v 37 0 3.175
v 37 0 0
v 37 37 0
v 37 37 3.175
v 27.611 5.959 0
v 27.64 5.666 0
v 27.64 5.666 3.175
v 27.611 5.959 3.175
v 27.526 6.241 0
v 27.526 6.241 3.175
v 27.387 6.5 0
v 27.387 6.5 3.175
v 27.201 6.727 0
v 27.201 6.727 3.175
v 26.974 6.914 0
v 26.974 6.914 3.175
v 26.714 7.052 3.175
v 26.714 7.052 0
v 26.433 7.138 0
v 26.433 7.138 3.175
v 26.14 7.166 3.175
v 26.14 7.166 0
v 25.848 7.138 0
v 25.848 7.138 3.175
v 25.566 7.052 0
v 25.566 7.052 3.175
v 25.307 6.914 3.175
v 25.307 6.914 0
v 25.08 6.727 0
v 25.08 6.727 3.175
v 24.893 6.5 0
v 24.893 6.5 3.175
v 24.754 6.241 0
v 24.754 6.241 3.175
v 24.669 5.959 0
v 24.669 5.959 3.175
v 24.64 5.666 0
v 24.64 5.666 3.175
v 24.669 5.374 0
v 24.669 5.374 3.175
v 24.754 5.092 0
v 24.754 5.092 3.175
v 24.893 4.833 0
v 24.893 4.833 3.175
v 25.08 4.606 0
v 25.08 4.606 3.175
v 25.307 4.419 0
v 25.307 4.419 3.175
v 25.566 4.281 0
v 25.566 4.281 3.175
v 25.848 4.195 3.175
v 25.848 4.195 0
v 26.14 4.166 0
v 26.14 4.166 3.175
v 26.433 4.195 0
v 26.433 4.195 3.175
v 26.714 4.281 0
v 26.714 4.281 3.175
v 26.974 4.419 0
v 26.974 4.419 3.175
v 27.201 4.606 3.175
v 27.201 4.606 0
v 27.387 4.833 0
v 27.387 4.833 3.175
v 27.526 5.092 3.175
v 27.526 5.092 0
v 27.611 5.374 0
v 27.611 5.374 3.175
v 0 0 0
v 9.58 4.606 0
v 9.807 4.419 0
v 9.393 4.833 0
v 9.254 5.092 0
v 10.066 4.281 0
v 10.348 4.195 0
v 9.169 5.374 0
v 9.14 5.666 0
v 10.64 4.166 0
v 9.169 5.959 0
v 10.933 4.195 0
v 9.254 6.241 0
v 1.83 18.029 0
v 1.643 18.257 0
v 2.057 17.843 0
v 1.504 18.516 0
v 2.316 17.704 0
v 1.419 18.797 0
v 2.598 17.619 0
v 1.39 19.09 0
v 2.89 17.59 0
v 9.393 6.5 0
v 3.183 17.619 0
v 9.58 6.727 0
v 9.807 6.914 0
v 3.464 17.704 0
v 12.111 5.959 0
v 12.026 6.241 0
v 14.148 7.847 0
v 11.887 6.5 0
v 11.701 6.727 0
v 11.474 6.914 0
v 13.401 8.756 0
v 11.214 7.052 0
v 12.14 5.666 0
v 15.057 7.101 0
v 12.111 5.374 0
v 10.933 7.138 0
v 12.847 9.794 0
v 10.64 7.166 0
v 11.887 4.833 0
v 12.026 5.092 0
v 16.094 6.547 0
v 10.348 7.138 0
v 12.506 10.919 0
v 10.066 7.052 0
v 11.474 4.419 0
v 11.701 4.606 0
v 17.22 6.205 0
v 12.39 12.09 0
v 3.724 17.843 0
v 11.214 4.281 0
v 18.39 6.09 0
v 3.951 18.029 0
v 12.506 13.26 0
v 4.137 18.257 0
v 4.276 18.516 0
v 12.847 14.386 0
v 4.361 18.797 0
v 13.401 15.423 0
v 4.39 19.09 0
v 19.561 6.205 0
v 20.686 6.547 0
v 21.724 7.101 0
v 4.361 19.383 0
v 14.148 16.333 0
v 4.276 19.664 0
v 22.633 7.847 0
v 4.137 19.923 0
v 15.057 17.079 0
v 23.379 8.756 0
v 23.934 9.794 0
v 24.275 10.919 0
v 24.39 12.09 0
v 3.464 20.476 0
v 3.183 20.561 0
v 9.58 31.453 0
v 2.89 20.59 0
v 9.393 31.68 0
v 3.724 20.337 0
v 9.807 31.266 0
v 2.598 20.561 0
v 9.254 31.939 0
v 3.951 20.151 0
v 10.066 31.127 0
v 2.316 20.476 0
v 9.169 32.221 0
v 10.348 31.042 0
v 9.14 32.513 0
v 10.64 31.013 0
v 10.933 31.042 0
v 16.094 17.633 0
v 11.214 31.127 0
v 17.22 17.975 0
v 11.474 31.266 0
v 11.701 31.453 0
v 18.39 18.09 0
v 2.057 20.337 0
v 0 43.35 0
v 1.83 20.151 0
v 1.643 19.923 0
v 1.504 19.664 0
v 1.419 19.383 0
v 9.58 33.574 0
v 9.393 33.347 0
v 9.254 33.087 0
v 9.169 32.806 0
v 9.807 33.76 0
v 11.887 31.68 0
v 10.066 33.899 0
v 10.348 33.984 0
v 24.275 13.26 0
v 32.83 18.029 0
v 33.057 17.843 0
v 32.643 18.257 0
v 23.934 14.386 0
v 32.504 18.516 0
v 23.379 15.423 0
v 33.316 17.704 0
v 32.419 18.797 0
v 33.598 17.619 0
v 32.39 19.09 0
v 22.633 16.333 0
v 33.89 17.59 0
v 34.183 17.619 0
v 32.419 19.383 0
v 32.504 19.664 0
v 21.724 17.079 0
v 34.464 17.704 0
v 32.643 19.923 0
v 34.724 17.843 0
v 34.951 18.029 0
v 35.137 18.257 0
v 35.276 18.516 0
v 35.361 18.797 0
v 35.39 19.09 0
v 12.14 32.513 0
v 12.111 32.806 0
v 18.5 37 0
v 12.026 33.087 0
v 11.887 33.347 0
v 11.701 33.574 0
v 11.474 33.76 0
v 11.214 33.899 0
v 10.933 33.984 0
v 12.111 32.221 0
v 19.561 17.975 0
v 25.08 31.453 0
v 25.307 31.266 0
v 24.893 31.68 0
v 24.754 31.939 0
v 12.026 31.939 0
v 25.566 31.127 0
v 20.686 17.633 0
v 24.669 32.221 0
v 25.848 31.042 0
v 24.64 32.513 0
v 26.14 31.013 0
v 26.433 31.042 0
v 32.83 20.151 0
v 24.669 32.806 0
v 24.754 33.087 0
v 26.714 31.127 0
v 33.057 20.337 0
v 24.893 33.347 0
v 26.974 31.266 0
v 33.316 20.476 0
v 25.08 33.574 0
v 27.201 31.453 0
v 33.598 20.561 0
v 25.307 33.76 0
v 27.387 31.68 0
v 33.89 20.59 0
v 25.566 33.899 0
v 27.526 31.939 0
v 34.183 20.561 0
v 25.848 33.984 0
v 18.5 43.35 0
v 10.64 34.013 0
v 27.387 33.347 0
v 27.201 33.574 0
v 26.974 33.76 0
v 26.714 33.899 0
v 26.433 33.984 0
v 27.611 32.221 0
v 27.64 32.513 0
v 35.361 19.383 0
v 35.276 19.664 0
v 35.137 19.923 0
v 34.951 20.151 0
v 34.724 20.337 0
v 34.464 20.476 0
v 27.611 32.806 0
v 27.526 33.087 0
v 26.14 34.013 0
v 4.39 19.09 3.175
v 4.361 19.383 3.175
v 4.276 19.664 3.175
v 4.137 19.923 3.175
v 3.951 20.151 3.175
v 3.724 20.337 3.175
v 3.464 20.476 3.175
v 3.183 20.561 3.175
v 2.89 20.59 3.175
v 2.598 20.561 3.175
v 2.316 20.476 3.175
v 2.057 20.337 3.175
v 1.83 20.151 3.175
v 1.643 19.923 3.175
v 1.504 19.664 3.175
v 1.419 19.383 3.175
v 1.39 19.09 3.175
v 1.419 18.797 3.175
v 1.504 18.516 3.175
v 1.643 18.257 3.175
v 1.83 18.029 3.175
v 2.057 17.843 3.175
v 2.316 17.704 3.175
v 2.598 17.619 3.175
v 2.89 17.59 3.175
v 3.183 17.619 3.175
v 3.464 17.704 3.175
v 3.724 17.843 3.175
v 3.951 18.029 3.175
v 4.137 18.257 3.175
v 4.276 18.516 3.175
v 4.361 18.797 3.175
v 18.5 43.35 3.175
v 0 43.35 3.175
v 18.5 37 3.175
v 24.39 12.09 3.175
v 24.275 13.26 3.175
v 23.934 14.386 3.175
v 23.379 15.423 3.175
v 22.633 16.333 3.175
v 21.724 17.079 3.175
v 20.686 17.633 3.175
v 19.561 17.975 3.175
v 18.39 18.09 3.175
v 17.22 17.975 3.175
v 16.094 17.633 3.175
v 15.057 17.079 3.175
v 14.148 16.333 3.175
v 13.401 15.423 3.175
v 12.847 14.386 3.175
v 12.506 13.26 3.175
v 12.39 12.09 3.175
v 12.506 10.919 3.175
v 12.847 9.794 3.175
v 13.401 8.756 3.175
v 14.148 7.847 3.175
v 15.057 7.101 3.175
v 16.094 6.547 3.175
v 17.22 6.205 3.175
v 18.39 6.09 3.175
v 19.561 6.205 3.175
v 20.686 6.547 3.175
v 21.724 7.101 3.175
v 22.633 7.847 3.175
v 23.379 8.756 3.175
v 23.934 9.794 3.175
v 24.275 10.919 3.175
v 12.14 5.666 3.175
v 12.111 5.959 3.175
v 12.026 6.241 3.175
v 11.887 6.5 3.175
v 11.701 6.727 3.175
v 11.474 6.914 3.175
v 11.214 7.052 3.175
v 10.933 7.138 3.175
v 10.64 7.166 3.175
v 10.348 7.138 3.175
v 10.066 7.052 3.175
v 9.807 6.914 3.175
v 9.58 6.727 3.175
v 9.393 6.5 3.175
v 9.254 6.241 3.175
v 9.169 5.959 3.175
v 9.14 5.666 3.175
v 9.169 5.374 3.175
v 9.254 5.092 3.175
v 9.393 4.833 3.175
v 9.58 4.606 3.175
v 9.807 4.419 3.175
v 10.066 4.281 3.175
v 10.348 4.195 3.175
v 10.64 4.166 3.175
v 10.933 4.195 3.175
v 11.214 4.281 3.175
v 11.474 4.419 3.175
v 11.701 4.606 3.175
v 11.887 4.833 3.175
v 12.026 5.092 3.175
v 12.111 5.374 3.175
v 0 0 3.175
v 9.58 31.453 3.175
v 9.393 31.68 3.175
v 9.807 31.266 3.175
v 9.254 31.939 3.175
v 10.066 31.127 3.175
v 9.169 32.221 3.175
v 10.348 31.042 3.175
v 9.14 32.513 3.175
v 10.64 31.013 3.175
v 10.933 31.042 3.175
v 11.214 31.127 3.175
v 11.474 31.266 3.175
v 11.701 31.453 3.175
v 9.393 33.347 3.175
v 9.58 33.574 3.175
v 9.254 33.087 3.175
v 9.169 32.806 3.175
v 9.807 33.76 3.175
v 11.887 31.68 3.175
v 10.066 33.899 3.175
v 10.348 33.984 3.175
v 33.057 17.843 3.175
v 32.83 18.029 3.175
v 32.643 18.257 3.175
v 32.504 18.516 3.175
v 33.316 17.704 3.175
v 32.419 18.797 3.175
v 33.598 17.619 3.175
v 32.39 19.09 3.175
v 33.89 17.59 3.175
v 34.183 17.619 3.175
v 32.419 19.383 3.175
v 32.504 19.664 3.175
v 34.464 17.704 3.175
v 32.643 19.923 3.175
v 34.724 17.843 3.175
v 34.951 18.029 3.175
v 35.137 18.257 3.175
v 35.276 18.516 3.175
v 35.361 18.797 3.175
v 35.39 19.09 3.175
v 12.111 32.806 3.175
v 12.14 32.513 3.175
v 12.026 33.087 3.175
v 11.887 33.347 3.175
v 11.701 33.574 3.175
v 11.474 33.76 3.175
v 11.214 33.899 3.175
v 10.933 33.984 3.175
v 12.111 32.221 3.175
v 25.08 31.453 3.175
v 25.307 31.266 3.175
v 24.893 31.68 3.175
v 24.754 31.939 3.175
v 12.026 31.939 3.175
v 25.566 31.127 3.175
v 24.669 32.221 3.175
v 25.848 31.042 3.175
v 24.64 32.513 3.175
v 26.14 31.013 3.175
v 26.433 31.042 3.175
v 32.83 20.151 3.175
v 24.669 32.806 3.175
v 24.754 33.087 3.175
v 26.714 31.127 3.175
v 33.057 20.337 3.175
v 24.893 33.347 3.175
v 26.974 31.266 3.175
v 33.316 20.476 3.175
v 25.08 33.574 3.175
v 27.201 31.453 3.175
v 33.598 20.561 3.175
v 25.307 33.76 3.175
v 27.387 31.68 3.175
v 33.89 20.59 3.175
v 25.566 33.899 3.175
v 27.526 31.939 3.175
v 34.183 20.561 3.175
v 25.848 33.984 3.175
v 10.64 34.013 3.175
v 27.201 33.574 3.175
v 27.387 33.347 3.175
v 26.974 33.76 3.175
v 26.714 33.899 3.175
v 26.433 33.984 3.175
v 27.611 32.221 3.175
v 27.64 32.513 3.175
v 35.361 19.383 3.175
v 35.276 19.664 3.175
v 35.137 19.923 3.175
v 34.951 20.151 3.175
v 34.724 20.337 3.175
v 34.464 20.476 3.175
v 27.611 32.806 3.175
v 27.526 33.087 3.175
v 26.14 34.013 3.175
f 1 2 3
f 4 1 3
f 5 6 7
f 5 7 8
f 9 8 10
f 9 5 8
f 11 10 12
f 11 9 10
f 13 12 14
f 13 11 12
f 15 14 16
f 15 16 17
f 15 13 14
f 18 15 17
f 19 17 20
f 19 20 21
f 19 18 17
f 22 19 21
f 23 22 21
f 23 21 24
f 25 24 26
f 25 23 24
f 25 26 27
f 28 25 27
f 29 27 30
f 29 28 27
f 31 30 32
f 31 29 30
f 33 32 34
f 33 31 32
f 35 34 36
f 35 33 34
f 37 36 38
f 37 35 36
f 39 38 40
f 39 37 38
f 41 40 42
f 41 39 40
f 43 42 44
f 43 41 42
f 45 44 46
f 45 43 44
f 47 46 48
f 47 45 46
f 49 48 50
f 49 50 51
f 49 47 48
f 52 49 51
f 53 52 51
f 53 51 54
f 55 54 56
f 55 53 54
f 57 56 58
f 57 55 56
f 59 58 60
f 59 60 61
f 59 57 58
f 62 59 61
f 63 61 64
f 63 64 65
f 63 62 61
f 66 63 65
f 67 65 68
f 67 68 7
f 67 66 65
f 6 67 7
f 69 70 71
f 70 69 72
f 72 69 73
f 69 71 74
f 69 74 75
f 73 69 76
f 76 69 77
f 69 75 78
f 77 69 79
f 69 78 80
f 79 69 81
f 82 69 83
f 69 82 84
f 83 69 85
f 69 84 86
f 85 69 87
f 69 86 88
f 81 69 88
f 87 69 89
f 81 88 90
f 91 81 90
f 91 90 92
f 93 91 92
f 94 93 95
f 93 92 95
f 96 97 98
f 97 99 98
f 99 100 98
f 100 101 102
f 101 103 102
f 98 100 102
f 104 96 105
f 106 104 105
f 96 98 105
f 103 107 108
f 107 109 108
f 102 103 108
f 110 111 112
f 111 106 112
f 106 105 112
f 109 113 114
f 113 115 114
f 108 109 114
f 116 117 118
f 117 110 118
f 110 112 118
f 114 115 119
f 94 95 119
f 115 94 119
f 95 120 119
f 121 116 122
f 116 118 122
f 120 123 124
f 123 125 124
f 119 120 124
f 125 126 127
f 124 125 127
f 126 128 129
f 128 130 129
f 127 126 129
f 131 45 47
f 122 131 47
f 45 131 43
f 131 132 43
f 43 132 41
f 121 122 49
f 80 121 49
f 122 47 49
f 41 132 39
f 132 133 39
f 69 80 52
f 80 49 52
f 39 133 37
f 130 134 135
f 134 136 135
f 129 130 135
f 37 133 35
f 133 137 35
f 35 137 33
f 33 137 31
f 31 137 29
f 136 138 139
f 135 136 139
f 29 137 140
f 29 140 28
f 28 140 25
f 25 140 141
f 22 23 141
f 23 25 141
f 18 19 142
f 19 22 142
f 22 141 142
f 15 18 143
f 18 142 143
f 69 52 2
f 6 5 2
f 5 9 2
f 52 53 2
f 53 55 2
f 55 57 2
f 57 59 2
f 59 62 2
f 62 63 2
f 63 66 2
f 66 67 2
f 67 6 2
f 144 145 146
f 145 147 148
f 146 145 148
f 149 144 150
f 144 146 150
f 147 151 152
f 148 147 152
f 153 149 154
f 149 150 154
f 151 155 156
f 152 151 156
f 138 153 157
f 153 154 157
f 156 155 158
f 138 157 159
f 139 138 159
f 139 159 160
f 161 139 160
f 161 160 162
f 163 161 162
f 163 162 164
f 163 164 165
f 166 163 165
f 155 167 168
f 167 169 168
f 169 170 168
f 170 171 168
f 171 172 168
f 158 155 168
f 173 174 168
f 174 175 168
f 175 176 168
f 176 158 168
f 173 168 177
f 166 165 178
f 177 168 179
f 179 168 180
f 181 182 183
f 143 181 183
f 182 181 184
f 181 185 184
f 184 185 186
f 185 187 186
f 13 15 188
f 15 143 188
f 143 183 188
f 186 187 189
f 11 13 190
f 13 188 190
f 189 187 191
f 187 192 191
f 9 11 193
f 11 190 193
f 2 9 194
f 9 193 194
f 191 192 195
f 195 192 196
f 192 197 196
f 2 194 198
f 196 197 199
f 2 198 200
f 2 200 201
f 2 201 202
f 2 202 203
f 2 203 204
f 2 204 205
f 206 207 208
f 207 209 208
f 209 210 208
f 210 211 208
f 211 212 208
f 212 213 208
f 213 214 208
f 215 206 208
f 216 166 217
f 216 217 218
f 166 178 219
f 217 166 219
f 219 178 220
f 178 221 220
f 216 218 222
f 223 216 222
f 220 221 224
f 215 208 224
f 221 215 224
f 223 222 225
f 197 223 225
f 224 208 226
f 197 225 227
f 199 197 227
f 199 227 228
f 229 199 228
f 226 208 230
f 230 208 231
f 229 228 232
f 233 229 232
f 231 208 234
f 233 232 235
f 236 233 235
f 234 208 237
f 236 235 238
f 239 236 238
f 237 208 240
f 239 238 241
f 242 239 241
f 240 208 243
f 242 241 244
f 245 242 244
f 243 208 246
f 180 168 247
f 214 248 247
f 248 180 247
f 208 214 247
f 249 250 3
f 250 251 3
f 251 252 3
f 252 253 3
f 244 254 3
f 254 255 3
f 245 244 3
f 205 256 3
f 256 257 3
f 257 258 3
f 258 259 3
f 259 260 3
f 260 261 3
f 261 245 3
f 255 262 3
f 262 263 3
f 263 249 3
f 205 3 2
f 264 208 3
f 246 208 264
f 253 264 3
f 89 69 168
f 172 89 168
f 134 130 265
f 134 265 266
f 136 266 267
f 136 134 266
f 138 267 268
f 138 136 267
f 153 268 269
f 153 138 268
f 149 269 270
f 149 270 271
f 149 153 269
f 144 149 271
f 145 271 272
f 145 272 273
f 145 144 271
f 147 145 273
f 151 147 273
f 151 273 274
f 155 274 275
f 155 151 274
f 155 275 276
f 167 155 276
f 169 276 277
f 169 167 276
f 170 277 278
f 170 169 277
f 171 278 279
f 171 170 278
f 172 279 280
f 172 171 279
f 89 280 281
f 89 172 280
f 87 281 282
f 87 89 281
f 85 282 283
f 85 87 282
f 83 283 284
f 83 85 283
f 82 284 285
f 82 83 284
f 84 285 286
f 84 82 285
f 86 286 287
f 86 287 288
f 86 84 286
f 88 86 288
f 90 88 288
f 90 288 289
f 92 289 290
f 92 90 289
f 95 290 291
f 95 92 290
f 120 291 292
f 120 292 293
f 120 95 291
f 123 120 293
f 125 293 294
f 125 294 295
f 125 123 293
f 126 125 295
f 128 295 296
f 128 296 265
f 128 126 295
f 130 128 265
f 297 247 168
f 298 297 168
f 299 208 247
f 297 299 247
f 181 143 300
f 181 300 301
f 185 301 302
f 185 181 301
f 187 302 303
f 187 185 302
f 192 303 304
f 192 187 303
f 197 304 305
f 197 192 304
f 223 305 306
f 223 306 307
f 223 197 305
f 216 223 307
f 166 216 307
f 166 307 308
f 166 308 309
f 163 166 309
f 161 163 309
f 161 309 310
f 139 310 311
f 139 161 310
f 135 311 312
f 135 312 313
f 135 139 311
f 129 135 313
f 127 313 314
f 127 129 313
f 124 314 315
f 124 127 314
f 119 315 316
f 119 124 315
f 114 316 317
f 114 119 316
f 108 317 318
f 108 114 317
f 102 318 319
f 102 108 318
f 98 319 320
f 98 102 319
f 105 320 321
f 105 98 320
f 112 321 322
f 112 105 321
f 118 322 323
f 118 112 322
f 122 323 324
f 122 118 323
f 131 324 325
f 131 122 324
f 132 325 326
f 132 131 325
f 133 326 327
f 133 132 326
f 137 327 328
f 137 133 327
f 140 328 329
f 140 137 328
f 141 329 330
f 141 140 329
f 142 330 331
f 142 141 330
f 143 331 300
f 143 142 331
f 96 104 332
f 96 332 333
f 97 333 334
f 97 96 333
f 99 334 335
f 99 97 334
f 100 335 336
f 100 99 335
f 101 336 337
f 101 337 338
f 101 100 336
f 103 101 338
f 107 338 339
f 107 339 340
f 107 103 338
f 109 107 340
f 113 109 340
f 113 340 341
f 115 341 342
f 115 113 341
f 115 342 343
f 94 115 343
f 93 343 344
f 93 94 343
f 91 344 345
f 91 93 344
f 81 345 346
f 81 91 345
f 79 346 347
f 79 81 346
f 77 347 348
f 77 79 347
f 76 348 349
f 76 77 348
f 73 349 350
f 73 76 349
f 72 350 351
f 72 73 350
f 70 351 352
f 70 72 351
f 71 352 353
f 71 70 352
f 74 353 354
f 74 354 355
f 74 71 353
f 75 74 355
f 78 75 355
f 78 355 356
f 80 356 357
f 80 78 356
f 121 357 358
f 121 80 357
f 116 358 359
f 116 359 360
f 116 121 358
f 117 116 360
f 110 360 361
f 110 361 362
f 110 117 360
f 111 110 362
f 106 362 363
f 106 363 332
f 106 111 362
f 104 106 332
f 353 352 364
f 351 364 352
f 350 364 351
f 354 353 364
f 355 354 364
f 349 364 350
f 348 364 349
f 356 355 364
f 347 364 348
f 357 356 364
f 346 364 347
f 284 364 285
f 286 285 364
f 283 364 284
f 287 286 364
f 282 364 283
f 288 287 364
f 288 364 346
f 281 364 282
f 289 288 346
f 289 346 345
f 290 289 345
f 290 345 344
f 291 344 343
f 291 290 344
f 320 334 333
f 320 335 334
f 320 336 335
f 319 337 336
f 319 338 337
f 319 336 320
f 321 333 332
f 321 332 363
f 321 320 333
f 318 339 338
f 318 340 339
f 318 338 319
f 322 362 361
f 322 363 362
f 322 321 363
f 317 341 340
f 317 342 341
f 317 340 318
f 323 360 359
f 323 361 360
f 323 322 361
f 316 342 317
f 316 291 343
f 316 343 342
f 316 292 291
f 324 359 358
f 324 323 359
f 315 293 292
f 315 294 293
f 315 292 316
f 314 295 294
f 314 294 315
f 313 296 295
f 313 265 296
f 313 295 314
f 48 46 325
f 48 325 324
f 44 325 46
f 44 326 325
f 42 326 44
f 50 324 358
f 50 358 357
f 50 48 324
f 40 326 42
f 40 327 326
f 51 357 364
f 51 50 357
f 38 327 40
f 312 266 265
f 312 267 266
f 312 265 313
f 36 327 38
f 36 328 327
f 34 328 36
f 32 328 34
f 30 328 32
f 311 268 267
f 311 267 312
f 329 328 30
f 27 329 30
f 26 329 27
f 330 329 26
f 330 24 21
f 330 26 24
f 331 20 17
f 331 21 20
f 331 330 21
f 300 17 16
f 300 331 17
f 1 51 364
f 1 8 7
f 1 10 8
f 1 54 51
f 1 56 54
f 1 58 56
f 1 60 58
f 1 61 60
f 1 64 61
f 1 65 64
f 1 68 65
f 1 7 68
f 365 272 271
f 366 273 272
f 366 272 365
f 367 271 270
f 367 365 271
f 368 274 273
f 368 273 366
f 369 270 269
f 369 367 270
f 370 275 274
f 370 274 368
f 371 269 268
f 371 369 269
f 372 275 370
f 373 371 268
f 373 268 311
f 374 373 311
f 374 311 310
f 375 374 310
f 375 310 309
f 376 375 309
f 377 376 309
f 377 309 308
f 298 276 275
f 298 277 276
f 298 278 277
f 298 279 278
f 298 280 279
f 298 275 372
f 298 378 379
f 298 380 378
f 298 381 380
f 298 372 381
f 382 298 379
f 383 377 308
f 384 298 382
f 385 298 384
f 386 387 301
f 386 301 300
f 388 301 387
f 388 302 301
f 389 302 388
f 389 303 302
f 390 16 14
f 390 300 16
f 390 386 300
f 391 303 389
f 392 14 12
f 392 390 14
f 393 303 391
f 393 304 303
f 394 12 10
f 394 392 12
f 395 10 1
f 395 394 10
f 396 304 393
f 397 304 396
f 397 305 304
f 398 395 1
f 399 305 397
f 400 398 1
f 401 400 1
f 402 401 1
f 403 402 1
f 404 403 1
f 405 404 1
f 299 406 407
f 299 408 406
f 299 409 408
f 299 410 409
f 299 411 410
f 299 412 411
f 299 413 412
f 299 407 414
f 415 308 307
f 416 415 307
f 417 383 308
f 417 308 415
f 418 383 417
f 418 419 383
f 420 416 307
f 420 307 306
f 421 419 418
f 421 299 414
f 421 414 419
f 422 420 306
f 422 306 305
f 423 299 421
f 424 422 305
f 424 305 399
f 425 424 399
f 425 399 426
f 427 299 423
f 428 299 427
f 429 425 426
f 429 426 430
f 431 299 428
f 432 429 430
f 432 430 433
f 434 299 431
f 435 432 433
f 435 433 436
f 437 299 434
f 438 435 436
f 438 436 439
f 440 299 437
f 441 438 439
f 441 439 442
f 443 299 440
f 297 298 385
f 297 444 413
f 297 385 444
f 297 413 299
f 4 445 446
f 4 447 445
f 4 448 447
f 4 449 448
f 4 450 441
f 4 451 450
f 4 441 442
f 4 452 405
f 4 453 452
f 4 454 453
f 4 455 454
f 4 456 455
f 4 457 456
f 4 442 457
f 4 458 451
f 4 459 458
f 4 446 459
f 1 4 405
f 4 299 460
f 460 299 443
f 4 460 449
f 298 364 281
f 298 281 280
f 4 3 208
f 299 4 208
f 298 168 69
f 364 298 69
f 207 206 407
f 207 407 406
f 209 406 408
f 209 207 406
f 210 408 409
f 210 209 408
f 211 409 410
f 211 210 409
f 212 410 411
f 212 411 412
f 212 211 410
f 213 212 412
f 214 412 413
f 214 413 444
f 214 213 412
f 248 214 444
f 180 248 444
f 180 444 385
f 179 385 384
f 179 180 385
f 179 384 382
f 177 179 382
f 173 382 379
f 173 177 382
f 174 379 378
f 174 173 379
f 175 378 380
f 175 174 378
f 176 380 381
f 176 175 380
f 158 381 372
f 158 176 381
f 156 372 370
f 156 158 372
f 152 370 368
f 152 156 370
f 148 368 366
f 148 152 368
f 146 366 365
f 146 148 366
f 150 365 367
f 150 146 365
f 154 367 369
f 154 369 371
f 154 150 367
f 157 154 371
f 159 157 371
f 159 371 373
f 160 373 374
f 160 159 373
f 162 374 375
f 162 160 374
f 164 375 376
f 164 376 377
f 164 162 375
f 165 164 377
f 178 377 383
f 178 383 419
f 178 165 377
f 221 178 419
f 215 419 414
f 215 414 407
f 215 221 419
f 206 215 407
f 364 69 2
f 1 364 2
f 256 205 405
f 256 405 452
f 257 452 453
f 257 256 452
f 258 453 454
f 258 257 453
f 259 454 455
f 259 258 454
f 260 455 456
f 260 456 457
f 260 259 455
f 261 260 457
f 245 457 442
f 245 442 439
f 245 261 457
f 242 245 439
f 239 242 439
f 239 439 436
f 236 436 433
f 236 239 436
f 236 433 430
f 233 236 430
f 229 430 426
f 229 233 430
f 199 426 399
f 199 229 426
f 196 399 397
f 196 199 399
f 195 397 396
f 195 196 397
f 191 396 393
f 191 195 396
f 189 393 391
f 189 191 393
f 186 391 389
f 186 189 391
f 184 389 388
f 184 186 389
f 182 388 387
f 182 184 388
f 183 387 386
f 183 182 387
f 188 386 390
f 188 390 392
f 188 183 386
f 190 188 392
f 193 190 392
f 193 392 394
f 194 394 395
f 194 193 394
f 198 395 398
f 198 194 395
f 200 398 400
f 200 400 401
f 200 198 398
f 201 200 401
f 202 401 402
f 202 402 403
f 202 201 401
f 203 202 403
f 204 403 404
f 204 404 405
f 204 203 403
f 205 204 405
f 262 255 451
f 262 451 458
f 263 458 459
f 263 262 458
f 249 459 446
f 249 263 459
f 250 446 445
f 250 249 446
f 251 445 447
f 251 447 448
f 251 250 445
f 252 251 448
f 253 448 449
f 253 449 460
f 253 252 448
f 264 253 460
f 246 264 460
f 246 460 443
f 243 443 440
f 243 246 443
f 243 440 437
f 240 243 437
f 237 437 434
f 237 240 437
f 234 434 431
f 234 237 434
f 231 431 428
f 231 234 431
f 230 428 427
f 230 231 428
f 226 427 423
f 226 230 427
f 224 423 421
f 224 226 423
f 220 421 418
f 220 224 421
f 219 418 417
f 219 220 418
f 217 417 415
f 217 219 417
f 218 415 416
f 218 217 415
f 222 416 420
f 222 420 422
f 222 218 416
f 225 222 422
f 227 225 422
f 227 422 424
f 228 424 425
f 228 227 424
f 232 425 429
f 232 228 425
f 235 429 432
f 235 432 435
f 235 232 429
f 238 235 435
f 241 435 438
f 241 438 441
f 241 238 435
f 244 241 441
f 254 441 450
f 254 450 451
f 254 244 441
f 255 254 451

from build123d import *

# Parameters (mm, degrees)
SKETCH1_R           = 6
SKETCH1_R_2         = 1.5
BOSS_EXTRUDE1_DEPTH = 3.175


with BuildPart() as part:
    # Sketch1 → Boss-Extrude1 (new body)
    with BuildSketch(Plane.XY):
        Polygon((18.5, 0), (37, 0), (37, 37), (18.5, 37), (18.5, 43.35), (0, 43.35), (0, 37), (0, 0), align=None)
        with Locations((18.39023312, 12.089873912)):
            Circle(SKETCH1_R, mode=Mode.SUBTRACT)
        with Locations((2.89023312, 19.089873912)):
            Circle(SKETCH1_R_2, mode=Mode.SUBTRACT)
        with Locations((10.64023312, 5.666480153)):
            Circle(SKETCH1_R_2, mode=Mode.SUBTRACT)
        with Locations((26.14023312, 5.666480153)):
            Circle(SKETCH1_R_2, mode=Mode.SUBTRACT)
        with Locations((33.89023312, 19.089873912)):
            Circle(SKETCH1_R_2, mode=Mode.SUBTRACT)
        with Locations((26.14023312, 32.513267671)):
            Circle(SKETCH1_R_2, mode=Mode.SUBTRACT)
        with Locations((10.64023312, 32.513267671)):
            Circle(SKETCH1_R_2, mode=Mode.SUBTRACT)
    extrude(amount=BOSS_EXTRUDE1_DEPTH)


solid = part.part
